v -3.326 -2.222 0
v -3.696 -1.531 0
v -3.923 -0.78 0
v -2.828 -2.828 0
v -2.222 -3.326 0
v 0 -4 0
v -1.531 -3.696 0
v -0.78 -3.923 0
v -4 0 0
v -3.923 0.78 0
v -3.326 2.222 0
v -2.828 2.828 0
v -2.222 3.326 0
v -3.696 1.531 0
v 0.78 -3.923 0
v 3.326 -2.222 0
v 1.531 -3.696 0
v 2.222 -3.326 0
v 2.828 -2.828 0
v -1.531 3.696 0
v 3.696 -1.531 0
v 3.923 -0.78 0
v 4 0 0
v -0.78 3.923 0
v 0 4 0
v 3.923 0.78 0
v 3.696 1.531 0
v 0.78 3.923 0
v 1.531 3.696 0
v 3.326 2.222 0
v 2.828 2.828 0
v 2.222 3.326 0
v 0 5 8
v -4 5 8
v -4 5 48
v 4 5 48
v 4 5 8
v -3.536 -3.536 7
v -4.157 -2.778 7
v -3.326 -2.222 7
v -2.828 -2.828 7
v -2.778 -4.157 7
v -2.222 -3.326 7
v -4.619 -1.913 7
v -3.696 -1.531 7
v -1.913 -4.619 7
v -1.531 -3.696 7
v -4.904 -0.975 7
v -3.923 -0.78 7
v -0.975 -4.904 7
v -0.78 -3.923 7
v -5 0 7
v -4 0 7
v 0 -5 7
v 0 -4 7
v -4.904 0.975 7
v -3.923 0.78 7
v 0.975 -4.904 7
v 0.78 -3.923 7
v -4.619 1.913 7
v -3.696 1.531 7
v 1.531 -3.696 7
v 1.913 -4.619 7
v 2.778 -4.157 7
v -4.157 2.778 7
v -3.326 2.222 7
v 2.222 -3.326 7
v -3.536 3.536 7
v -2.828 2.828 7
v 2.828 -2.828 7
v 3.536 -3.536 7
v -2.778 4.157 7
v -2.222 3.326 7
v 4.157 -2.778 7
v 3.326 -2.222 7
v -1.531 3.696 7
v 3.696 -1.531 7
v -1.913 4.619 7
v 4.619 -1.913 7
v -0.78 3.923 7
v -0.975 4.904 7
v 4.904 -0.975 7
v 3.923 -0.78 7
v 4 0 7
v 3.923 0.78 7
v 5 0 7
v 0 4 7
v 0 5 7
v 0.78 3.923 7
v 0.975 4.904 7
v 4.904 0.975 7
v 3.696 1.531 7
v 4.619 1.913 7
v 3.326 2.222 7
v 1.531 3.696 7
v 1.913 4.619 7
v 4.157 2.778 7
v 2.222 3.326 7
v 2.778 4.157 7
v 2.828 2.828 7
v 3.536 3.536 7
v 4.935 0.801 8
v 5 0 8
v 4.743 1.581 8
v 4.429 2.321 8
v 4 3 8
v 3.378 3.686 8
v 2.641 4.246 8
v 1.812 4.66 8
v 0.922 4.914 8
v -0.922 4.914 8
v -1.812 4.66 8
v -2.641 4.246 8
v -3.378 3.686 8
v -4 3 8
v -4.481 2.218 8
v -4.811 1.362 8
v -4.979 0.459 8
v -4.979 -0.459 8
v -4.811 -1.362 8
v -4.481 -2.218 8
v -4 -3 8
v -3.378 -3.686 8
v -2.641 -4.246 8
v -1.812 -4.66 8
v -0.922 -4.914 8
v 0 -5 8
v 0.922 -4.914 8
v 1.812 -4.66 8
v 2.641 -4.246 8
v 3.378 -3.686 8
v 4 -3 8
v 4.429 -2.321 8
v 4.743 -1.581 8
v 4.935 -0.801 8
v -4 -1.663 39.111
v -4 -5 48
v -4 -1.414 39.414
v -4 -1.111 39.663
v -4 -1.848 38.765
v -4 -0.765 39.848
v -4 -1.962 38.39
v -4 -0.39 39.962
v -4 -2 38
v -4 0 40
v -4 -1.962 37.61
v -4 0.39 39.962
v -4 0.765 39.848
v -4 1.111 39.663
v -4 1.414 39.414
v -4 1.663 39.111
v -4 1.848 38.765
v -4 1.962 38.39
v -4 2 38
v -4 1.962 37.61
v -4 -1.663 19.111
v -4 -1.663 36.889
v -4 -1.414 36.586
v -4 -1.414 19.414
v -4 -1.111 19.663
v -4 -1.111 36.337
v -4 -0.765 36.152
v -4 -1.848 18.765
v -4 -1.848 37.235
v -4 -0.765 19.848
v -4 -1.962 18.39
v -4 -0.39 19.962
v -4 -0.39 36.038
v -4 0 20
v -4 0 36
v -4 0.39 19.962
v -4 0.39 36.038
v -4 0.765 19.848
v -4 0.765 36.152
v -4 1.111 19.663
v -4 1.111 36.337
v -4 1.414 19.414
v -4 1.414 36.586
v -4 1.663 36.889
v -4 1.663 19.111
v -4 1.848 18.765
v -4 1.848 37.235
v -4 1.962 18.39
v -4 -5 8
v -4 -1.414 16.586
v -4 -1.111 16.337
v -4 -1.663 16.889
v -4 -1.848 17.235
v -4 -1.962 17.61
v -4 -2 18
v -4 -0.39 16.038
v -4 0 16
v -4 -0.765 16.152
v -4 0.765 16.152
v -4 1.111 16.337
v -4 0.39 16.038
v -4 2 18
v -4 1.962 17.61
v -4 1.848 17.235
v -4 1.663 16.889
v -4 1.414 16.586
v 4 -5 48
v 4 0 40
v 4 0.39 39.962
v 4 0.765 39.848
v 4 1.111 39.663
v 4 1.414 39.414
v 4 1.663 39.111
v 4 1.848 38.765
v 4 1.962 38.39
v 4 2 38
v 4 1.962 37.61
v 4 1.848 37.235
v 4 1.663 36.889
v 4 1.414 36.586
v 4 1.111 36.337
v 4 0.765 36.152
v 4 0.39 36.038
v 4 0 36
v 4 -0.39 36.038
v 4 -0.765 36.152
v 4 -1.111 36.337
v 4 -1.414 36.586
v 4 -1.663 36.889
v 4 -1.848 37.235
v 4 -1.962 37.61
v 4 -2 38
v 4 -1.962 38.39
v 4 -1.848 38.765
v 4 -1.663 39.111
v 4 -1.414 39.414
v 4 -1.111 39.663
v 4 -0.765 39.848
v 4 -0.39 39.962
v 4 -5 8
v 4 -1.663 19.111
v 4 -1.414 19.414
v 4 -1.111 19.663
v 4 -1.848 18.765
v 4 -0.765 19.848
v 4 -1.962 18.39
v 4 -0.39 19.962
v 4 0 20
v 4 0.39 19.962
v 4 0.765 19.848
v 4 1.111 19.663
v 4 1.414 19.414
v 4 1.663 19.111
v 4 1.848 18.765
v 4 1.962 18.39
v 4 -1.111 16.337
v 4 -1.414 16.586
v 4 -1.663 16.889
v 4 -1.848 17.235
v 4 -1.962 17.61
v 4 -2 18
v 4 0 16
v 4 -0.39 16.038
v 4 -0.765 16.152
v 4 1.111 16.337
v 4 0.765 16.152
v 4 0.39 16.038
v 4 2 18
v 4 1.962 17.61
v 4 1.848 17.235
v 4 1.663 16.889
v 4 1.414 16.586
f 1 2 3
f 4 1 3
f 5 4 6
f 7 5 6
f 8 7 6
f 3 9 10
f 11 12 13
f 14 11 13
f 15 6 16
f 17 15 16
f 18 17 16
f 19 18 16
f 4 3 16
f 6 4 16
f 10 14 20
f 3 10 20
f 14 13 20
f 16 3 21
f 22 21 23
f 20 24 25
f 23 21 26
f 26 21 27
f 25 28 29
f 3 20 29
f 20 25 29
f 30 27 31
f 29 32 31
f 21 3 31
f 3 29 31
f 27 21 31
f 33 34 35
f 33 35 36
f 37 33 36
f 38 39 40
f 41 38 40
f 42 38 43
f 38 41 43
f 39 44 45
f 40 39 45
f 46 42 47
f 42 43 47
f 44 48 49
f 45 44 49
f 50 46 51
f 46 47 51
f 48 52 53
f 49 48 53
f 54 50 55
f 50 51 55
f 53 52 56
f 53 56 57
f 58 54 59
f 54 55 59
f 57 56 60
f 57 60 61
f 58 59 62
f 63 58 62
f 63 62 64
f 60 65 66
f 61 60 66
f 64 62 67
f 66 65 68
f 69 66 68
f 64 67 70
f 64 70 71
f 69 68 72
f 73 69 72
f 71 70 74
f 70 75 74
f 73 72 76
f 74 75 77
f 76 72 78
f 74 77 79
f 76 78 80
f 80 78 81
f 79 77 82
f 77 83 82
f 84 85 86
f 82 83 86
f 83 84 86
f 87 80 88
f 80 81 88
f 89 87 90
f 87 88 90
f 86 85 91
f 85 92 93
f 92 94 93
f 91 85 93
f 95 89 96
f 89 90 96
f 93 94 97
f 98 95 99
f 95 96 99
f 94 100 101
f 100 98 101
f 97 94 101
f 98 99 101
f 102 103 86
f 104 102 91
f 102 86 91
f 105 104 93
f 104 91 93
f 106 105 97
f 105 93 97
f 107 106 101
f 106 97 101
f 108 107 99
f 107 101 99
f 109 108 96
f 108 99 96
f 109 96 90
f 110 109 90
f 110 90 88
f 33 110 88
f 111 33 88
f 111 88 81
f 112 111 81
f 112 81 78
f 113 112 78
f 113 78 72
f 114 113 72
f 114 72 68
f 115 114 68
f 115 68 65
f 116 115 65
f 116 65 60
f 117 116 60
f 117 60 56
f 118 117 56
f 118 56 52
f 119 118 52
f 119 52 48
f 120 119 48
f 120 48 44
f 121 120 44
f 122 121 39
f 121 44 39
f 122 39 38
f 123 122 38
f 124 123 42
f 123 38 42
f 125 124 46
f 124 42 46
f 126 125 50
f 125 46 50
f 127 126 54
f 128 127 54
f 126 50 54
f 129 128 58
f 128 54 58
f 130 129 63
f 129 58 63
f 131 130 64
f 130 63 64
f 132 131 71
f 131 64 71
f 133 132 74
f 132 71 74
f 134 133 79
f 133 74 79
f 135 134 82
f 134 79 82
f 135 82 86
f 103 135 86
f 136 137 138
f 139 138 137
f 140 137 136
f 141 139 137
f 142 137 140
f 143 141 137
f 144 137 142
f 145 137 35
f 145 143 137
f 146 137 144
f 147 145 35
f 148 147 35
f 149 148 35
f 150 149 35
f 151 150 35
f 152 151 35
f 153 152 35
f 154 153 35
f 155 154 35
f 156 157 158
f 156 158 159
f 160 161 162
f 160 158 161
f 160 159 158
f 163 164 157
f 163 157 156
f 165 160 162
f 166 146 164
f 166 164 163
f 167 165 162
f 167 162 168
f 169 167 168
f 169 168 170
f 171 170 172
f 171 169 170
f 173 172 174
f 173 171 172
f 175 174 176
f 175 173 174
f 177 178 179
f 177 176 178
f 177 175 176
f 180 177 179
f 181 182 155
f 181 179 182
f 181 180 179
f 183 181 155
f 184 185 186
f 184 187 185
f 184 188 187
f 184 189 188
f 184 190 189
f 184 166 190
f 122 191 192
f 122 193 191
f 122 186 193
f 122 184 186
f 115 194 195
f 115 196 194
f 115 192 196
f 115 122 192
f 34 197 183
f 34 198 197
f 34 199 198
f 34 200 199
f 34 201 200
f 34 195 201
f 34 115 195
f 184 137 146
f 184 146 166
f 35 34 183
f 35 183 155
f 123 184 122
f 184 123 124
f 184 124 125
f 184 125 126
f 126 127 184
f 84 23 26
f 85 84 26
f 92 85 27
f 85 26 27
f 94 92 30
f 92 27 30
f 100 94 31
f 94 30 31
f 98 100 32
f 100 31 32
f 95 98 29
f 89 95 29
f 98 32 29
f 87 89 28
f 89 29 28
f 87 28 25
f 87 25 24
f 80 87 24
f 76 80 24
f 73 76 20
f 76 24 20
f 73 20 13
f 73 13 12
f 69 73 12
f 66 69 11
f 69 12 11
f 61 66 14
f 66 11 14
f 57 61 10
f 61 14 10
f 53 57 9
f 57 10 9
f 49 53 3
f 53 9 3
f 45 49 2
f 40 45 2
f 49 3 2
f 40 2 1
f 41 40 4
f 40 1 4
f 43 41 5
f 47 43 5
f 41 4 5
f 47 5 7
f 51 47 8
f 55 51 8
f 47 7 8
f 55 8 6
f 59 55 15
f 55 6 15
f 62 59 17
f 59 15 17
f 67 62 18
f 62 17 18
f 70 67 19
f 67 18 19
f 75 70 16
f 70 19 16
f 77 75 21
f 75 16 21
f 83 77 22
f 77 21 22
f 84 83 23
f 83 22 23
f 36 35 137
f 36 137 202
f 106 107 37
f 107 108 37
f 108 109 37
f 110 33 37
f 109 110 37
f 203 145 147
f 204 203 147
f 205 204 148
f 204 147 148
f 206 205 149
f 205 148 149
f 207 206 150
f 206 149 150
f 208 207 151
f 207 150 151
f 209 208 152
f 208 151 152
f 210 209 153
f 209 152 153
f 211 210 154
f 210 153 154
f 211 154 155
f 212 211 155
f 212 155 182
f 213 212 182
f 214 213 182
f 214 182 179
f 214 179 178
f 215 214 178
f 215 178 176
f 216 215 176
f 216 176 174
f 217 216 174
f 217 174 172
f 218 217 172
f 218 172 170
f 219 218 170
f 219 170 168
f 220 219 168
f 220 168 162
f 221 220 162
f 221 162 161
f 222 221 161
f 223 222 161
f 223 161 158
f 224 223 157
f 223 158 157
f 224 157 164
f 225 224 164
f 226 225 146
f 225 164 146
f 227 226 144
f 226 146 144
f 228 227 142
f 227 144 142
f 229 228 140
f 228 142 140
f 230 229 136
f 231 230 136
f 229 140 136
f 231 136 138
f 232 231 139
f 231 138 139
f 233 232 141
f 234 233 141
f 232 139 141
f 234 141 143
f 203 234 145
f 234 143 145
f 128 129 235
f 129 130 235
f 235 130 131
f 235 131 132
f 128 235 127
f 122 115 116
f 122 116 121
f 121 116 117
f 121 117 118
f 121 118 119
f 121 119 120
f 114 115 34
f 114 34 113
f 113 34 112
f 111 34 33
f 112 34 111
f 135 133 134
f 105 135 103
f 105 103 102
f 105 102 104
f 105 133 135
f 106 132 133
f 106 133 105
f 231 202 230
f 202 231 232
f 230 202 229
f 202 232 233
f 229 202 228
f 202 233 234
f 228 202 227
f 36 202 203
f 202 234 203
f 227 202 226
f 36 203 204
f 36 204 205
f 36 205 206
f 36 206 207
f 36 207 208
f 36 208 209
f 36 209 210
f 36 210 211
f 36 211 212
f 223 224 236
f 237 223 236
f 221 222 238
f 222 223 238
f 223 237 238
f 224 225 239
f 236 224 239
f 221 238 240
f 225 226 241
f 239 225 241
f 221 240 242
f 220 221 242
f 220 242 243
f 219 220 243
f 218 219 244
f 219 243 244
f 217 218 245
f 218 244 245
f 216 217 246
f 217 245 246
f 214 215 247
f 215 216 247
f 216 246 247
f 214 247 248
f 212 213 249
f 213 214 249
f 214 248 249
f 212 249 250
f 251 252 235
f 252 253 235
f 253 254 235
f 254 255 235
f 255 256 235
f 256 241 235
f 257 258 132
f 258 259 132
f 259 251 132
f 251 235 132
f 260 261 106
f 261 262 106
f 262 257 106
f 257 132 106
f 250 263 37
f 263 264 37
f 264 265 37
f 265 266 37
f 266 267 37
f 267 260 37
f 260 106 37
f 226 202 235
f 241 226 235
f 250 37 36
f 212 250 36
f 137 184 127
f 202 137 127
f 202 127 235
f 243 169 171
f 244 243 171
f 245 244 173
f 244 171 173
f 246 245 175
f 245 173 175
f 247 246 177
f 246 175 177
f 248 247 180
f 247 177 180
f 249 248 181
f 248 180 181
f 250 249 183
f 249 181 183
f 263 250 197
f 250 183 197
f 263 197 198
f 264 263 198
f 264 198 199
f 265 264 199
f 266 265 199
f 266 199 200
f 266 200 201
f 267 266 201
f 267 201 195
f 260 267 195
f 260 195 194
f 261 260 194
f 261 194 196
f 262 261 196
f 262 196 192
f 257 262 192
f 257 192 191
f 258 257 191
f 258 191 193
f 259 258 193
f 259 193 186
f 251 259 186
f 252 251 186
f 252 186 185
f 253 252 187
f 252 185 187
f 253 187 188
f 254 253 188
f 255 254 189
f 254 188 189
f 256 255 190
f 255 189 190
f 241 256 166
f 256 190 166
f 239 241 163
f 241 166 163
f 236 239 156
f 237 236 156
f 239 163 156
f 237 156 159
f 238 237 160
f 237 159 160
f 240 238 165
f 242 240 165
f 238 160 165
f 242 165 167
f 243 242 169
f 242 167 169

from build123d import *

# Parameters (mm, degrees)
SKETCH_1_R          = 4
EXTRUDE_1_DEPTH     = 7
SKETCH_2_R          = 5
EXTRUDE_2_DEPTH     = 1
SKETCH_3_W          = 8
SKETCH_3_H          = 10
EXTRUDE_3_DEPTH     = 40
CUT_EXTRUDE_1_REACH = 11
SKETCH_4_R          = 2


with BuildPart() as part:
    # Эскиз1 → Бобышка-Вытянуть1 (new body)
    with BuildSketch(Plane.XY):
        Circle(SKETCH_1_R)
    extrude(amount=EXTRUDE_1_DEPTH)

    # Эскиз2 → Бобышка-Вытянуть2 (add)
    with BuildSketch(Plane.XY.offset(7)):
        Circle(SKETCH_2_R)
    extrude(amount=EXTRUDE_2_DEPTH)

    # Эскиз3 → Бобышка-Вытянуть3 (add)
    with BuildSketch(Plane.XY.offset(8)):
        Rectangle(SKETCH_3_W, SKETCH_3_H)
    extrude(amount=EXTRUDE_3_DEPTH)

    # Эскиз4 → Вырез-Вытянуть1 (cut, up to next)
    with BuildSketch(Plane.ZY.offset(4), mode=Mode.PRIVATE) as cut_extrude_1_sk1:
        with Locations((18, 0)):
            Circle(SKETCH_4_R)
    cut_extrude_1_tool1 = extrude(cut_extrude_1_sk1.sketch, amount=-CUT_EXTRUDE_1_REACH, mode=Mode.PRIVATE) & part.part
    add(cut_extrude_1_tool1.solids().sort_by_distance((-4, 0, 18))[0], mode=Mode.SUBTRACT)
    # Эскиз4 → Вырез-Вытянуть1 (cut, up to next)
    with BuildSketch(Plane.ZY.offset(4), mode=Mode.PRIVATE) as cut_extrude_1_sk2:
        with Locations((38, 0)):
            Circle(SKETCH_4_R)
    cut_extrude_1_tool2 = extrude(cut_extrude_1_sk2.sketch, amount=-CUT_EXTRUDE_1_REACH, mode=Mode.PRIVATE) & part.part
    add(cut_extrude_1_tool2.solids().sort_by_distance((-4, 0, 38))[0], mode=Mode.SUBTRACT)


solid = part.part
